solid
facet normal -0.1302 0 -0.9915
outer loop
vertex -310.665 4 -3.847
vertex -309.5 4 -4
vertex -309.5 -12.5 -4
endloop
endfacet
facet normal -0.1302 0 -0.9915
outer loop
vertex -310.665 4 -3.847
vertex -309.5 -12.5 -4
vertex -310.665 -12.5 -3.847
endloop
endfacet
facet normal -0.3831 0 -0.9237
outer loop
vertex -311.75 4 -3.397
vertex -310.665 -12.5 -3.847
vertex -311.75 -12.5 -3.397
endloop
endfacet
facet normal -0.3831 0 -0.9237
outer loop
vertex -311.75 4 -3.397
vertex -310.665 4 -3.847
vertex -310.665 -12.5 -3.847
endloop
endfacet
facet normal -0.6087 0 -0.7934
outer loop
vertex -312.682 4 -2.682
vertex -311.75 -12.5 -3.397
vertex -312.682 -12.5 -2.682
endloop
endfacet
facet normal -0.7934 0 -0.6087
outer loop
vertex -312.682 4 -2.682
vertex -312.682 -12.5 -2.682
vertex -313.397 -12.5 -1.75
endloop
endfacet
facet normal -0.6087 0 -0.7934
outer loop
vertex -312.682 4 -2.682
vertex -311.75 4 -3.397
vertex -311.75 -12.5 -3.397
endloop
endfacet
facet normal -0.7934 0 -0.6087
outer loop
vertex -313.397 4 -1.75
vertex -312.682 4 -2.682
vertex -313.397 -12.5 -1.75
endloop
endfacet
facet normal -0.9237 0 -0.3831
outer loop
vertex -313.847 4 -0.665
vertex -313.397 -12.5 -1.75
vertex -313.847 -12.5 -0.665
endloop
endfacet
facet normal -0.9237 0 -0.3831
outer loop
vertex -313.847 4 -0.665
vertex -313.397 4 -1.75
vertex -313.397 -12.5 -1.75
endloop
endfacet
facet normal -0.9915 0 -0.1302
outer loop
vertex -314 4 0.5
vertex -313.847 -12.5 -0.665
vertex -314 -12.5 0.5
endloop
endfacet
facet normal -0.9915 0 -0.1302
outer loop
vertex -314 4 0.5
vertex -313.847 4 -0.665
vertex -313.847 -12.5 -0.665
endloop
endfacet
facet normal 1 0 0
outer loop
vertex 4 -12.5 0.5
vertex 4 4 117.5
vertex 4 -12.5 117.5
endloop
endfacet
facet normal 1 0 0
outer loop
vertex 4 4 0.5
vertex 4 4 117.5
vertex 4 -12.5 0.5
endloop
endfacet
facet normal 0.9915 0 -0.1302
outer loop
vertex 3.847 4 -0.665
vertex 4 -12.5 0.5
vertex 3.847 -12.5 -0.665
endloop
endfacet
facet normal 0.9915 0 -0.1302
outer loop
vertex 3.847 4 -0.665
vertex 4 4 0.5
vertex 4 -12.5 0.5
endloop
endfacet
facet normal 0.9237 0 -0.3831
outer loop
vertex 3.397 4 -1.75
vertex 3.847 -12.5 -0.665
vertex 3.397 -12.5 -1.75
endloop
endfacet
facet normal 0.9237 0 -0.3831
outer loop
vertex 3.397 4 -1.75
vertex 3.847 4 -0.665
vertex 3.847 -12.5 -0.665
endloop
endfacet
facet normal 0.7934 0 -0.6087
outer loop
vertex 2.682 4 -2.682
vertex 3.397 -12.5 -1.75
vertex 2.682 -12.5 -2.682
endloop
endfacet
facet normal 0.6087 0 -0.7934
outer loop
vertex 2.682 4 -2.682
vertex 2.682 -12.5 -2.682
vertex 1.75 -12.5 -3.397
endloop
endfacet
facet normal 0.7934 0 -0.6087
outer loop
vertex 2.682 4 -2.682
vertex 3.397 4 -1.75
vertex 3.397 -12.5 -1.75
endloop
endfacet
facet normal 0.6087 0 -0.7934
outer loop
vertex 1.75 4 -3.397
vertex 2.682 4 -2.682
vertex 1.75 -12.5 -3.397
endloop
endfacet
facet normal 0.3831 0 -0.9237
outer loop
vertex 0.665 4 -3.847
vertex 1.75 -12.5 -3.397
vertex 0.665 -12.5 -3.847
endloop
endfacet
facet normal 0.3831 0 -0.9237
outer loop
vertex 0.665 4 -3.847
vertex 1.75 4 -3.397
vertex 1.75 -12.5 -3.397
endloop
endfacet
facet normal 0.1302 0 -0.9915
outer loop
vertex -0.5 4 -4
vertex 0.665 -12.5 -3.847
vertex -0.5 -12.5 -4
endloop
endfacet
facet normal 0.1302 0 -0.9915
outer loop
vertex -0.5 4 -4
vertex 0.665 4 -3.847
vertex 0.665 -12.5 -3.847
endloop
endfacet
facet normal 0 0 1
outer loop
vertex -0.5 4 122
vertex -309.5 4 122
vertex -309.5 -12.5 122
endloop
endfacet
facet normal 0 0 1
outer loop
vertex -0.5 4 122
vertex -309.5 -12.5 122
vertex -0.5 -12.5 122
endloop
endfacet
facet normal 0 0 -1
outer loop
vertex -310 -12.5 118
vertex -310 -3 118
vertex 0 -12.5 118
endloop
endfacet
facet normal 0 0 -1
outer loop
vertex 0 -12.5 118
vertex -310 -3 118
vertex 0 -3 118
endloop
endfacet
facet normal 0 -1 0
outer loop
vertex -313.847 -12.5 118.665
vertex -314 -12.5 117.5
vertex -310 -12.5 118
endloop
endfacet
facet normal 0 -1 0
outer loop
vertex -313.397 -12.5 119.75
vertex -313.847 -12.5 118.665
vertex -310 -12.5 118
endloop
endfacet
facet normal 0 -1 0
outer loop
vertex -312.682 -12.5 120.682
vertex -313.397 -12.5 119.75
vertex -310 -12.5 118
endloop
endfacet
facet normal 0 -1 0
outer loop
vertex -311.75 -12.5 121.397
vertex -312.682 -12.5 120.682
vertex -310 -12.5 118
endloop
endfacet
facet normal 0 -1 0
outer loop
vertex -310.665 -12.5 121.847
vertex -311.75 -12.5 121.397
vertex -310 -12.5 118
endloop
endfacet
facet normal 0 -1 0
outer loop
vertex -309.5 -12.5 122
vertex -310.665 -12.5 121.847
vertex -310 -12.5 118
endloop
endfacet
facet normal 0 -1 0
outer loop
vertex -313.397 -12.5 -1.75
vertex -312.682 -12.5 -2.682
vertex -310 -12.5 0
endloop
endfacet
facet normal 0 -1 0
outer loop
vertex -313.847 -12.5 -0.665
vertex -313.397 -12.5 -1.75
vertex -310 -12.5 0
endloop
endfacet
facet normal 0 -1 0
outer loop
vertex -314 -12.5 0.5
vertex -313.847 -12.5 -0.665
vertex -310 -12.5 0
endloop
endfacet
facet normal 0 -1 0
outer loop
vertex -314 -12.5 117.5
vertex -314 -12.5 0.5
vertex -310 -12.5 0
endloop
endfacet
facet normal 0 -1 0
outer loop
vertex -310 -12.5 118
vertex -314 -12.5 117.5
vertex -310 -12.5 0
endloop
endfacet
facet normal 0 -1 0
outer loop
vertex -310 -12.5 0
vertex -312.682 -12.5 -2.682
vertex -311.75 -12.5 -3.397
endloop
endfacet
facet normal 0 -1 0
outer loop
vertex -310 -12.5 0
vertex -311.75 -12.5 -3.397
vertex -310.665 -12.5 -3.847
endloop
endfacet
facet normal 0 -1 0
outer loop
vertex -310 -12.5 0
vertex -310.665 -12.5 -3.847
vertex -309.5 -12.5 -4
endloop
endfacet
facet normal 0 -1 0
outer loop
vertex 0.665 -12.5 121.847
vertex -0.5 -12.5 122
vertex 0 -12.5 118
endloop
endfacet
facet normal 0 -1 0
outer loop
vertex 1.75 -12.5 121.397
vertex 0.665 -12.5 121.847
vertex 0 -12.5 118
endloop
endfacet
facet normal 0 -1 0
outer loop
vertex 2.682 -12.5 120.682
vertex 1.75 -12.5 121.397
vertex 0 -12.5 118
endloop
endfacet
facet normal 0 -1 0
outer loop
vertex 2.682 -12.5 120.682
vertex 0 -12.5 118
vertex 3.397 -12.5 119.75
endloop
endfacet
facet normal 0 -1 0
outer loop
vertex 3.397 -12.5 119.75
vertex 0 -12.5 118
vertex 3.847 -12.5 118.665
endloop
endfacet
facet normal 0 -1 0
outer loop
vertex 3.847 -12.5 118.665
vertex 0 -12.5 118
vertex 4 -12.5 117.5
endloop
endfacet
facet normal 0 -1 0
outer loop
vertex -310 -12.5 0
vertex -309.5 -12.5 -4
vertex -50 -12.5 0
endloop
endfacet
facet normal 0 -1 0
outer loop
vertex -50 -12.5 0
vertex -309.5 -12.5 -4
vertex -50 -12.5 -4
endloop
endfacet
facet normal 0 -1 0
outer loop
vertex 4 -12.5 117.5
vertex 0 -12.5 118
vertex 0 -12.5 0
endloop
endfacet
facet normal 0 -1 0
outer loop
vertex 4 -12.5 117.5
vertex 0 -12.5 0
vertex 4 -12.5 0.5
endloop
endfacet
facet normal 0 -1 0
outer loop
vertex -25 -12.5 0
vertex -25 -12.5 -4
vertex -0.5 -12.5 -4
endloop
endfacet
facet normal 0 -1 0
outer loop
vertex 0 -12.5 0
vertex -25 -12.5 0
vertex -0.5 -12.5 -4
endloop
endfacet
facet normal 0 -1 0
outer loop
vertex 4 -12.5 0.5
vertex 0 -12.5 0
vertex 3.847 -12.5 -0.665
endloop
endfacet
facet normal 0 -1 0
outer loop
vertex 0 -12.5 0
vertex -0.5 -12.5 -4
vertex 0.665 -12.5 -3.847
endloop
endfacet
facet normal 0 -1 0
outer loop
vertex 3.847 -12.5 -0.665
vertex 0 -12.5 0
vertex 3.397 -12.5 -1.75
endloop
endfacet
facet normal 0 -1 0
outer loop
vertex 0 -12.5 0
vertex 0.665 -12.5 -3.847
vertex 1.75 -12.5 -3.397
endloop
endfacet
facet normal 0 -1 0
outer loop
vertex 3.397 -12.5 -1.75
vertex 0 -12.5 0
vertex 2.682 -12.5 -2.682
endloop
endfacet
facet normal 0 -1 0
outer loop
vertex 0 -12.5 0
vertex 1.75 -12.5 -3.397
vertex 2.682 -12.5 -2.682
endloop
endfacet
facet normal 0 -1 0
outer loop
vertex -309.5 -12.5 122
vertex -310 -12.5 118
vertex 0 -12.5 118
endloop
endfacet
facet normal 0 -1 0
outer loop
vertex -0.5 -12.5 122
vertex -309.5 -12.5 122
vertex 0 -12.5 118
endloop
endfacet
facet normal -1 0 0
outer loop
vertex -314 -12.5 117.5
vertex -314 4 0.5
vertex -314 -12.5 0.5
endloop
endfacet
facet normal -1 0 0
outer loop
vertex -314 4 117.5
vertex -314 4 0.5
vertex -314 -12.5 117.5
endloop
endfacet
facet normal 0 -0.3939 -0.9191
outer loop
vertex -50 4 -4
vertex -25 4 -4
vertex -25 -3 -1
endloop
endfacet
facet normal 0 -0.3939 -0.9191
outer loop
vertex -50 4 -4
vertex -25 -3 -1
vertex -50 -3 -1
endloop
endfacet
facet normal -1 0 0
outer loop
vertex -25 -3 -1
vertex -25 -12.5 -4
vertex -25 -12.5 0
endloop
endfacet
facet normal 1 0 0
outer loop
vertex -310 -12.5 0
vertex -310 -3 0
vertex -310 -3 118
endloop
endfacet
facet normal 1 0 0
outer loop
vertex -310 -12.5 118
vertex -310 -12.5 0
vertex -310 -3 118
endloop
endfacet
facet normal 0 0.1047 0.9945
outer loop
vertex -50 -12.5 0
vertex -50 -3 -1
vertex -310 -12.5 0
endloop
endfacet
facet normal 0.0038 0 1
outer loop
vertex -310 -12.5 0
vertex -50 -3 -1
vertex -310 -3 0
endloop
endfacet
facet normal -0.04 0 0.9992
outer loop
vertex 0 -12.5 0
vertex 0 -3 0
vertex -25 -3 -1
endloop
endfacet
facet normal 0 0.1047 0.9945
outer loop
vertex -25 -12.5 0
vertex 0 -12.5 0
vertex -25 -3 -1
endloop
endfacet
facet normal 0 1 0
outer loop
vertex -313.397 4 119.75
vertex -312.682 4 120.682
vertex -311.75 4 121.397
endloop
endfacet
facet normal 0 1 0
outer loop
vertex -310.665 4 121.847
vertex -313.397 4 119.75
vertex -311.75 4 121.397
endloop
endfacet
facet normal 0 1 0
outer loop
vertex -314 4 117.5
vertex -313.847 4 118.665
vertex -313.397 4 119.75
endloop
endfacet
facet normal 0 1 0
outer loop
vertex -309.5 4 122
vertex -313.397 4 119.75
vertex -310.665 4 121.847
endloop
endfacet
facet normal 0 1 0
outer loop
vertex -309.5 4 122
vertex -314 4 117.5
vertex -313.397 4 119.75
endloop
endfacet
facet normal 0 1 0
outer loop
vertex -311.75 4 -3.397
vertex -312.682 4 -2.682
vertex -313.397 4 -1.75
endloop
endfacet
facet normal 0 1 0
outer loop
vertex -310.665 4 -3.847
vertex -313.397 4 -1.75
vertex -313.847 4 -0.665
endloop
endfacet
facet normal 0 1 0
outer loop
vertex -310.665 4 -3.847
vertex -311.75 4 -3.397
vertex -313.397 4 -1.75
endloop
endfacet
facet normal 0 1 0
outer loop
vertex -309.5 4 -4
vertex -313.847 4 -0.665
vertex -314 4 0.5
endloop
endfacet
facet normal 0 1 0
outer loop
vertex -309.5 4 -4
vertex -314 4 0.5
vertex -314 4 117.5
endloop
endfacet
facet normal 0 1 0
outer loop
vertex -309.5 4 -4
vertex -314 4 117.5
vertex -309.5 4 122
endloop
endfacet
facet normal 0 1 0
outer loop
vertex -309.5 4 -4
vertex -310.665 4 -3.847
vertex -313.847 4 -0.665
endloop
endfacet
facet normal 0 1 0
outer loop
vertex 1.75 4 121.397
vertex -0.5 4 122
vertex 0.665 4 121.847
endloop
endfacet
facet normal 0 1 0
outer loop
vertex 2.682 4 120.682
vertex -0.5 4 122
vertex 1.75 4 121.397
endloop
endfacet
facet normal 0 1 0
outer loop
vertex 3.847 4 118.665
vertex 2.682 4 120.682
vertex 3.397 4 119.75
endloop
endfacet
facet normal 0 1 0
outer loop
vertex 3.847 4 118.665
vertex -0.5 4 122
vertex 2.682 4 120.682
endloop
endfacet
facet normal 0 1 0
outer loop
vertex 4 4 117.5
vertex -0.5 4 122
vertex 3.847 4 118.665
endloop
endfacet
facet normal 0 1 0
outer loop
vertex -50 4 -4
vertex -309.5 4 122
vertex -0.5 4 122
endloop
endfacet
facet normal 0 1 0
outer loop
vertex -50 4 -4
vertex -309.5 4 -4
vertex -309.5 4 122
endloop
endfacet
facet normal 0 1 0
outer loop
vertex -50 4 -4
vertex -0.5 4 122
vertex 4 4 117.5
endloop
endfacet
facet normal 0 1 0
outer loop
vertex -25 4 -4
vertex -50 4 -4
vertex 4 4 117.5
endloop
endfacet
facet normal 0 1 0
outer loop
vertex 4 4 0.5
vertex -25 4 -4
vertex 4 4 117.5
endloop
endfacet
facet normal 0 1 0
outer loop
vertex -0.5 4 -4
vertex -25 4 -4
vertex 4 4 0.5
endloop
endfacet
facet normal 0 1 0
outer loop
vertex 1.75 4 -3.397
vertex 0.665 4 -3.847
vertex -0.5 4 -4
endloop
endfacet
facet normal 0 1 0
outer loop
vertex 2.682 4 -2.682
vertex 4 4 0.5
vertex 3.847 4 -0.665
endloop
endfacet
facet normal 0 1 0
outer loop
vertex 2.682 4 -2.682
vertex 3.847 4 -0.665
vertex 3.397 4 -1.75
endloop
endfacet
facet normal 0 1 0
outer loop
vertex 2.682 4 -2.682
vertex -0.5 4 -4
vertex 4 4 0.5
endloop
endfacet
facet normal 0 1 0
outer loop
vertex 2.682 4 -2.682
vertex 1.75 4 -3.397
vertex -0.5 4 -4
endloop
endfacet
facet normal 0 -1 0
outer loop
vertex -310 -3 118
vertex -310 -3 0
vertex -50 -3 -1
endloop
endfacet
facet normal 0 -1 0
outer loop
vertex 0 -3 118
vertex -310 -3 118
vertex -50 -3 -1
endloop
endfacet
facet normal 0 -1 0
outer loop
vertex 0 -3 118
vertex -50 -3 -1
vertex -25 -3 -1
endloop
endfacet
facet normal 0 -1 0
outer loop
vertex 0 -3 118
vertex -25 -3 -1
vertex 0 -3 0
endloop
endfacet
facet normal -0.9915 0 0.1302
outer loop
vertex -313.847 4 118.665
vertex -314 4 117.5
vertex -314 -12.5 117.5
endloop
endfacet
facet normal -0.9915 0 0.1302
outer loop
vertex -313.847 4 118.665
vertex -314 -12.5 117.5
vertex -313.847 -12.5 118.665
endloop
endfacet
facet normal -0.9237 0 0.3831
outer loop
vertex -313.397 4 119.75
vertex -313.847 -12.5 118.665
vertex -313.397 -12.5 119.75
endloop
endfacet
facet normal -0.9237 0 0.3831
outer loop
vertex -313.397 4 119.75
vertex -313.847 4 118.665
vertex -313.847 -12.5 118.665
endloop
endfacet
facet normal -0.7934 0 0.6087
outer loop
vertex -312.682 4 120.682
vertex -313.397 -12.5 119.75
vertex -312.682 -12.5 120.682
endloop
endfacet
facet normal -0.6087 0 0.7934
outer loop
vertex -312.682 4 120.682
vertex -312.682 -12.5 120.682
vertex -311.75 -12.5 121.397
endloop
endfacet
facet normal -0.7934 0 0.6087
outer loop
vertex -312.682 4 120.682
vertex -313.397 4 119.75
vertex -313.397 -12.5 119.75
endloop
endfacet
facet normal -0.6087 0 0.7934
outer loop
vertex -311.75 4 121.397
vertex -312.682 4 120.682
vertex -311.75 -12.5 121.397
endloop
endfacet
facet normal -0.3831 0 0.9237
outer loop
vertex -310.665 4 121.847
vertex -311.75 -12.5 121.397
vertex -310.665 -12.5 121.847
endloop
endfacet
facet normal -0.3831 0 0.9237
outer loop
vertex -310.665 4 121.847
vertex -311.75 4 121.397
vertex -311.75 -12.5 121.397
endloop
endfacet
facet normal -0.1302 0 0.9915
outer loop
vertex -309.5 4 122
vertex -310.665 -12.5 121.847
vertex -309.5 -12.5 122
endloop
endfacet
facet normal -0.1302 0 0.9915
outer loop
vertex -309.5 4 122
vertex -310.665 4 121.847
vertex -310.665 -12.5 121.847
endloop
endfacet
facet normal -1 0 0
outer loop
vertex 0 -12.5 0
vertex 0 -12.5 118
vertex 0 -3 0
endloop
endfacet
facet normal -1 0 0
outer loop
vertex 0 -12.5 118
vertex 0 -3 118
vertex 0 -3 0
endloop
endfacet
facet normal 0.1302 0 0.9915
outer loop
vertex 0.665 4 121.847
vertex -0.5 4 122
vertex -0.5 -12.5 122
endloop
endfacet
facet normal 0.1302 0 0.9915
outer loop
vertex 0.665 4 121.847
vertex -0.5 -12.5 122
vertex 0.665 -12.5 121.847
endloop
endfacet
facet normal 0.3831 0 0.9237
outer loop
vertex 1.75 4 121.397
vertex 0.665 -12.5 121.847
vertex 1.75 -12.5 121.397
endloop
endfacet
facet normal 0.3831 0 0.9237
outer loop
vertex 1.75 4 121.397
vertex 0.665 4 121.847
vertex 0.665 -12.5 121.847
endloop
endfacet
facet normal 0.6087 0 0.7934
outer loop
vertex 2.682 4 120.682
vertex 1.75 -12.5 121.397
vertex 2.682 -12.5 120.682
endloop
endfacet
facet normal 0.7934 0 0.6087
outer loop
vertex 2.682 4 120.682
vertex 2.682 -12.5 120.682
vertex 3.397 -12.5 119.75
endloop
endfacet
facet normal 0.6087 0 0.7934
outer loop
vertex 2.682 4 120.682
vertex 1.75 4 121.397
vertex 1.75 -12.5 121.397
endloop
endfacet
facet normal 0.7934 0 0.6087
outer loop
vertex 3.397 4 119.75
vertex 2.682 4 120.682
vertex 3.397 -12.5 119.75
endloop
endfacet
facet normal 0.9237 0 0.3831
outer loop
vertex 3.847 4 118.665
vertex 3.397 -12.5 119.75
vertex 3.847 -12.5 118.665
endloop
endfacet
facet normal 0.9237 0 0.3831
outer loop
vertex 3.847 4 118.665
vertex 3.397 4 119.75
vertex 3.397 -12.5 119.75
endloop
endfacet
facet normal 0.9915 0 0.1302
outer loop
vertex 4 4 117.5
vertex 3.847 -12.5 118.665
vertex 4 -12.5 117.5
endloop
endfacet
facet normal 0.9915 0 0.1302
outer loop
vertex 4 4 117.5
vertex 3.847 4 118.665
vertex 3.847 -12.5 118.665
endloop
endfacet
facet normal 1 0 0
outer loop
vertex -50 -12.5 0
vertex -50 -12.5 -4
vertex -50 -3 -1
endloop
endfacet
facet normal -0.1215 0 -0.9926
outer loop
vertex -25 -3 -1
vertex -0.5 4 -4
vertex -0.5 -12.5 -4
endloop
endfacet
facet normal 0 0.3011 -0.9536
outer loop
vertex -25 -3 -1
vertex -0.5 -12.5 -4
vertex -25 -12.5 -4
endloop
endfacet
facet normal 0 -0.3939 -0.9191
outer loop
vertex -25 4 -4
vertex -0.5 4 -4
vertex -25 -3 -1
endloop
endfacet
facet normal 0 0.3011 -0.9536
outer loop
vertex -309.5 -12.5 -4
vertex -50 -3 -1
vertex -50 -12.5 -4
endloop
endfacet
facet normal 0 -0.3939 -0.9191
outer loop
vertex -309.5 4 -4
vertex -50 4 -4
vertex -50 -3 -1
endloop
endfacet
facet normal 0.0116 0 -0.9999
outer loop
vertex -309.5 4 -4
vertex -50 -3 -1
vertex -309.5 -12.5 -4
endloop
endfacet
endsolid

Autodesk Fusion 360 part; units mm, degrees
sketch "Szkic1" plane through (0, 0, 0) normal (0, 0, 1) x (1, 0, 0)
sketch "Szkic2" plane through (0, 0, 0) normal (0, 1, 0) x (1, 0, 0)
  line L0 (-150, 0) -> (-119, 0)
  line L1 (0, 0) -> (-310, 0)
  line L2 (-310, 0) -> (-310, -118)
  line L3 (-310, -118) -> (0, -118)
  line L4 (0, -118) -> (0, 0)
  line L5 (4, -117.5) -> (4, -0.5)
  line L6 (-0.5, 4) -> (-309.5, 4)
  line L7 (-314, -0.5) -> (-314, -117.5)
  line L8 (-309.5, -122) -> (-0.5, -122)
  arc A0 (4, -0.5) -> (-0.5, 4) centre (-0.5, -0.5) ccw
  arc A1 (-0.5, -122) -> (4, -117.5) centre (-0.5, -117.5) ccw
  arc A2 (-314, -117.5) -> (-309.5, -122) centre (-309.5, -117.5) ccw
  arc A3 (-309.5, 4) -> (-314, -0.5) centre (-309.5, -0.5) ccw
  dimension "d1" = 31
  dimension "d2" = 118
  dimension "d3" = 4.5
sketch "Szkic3" plane through (0, 0, 0) normal (0, 1, 0) x (1, 0, 0)
sketch "Szkic4" plane through (0, 0, 0) normal (0, 1, 0) x (1, 0, 0)
  line L0 (-0.5, 4) -> (-309.5, 4)
  line L1 (0, 0) -> (-310, 0)
  line L2 (-25, 4) -> (-25, 0)
  line L3 (-50, 4) -> (-50, 0)
extrude "Wyciągnięcie proste1" add sketch "Szkic2" against normal blind 12.5
sketch "Szkic5" plane through (0, 0, 0) normal (0, 1, 0) x (1, 0, 0)
  line L0 (0, 0) -> (-310, 0)
  line L1 (-310, 0) -> (-310, -120)
  line L2 (-310, -120) -> (0, -120)
  line L3 (0, -120) -> (0, 0)
sketch "Szkic6" plane through (0, 0, 0) normal (0, 1, 0) x (1, 0, 0)
extrude "Wyciągnięcie proste2" add sketch "Szkic5" against normal blind 3
extrude "Wyciągnięcie proste3" cut sketch "Szkic4" against normal blind 13
move_face "Odsuń powierzchnie1" offset 4 2 faces at (-120, 0, 81.3333) (-33.3333, -1, 0)
